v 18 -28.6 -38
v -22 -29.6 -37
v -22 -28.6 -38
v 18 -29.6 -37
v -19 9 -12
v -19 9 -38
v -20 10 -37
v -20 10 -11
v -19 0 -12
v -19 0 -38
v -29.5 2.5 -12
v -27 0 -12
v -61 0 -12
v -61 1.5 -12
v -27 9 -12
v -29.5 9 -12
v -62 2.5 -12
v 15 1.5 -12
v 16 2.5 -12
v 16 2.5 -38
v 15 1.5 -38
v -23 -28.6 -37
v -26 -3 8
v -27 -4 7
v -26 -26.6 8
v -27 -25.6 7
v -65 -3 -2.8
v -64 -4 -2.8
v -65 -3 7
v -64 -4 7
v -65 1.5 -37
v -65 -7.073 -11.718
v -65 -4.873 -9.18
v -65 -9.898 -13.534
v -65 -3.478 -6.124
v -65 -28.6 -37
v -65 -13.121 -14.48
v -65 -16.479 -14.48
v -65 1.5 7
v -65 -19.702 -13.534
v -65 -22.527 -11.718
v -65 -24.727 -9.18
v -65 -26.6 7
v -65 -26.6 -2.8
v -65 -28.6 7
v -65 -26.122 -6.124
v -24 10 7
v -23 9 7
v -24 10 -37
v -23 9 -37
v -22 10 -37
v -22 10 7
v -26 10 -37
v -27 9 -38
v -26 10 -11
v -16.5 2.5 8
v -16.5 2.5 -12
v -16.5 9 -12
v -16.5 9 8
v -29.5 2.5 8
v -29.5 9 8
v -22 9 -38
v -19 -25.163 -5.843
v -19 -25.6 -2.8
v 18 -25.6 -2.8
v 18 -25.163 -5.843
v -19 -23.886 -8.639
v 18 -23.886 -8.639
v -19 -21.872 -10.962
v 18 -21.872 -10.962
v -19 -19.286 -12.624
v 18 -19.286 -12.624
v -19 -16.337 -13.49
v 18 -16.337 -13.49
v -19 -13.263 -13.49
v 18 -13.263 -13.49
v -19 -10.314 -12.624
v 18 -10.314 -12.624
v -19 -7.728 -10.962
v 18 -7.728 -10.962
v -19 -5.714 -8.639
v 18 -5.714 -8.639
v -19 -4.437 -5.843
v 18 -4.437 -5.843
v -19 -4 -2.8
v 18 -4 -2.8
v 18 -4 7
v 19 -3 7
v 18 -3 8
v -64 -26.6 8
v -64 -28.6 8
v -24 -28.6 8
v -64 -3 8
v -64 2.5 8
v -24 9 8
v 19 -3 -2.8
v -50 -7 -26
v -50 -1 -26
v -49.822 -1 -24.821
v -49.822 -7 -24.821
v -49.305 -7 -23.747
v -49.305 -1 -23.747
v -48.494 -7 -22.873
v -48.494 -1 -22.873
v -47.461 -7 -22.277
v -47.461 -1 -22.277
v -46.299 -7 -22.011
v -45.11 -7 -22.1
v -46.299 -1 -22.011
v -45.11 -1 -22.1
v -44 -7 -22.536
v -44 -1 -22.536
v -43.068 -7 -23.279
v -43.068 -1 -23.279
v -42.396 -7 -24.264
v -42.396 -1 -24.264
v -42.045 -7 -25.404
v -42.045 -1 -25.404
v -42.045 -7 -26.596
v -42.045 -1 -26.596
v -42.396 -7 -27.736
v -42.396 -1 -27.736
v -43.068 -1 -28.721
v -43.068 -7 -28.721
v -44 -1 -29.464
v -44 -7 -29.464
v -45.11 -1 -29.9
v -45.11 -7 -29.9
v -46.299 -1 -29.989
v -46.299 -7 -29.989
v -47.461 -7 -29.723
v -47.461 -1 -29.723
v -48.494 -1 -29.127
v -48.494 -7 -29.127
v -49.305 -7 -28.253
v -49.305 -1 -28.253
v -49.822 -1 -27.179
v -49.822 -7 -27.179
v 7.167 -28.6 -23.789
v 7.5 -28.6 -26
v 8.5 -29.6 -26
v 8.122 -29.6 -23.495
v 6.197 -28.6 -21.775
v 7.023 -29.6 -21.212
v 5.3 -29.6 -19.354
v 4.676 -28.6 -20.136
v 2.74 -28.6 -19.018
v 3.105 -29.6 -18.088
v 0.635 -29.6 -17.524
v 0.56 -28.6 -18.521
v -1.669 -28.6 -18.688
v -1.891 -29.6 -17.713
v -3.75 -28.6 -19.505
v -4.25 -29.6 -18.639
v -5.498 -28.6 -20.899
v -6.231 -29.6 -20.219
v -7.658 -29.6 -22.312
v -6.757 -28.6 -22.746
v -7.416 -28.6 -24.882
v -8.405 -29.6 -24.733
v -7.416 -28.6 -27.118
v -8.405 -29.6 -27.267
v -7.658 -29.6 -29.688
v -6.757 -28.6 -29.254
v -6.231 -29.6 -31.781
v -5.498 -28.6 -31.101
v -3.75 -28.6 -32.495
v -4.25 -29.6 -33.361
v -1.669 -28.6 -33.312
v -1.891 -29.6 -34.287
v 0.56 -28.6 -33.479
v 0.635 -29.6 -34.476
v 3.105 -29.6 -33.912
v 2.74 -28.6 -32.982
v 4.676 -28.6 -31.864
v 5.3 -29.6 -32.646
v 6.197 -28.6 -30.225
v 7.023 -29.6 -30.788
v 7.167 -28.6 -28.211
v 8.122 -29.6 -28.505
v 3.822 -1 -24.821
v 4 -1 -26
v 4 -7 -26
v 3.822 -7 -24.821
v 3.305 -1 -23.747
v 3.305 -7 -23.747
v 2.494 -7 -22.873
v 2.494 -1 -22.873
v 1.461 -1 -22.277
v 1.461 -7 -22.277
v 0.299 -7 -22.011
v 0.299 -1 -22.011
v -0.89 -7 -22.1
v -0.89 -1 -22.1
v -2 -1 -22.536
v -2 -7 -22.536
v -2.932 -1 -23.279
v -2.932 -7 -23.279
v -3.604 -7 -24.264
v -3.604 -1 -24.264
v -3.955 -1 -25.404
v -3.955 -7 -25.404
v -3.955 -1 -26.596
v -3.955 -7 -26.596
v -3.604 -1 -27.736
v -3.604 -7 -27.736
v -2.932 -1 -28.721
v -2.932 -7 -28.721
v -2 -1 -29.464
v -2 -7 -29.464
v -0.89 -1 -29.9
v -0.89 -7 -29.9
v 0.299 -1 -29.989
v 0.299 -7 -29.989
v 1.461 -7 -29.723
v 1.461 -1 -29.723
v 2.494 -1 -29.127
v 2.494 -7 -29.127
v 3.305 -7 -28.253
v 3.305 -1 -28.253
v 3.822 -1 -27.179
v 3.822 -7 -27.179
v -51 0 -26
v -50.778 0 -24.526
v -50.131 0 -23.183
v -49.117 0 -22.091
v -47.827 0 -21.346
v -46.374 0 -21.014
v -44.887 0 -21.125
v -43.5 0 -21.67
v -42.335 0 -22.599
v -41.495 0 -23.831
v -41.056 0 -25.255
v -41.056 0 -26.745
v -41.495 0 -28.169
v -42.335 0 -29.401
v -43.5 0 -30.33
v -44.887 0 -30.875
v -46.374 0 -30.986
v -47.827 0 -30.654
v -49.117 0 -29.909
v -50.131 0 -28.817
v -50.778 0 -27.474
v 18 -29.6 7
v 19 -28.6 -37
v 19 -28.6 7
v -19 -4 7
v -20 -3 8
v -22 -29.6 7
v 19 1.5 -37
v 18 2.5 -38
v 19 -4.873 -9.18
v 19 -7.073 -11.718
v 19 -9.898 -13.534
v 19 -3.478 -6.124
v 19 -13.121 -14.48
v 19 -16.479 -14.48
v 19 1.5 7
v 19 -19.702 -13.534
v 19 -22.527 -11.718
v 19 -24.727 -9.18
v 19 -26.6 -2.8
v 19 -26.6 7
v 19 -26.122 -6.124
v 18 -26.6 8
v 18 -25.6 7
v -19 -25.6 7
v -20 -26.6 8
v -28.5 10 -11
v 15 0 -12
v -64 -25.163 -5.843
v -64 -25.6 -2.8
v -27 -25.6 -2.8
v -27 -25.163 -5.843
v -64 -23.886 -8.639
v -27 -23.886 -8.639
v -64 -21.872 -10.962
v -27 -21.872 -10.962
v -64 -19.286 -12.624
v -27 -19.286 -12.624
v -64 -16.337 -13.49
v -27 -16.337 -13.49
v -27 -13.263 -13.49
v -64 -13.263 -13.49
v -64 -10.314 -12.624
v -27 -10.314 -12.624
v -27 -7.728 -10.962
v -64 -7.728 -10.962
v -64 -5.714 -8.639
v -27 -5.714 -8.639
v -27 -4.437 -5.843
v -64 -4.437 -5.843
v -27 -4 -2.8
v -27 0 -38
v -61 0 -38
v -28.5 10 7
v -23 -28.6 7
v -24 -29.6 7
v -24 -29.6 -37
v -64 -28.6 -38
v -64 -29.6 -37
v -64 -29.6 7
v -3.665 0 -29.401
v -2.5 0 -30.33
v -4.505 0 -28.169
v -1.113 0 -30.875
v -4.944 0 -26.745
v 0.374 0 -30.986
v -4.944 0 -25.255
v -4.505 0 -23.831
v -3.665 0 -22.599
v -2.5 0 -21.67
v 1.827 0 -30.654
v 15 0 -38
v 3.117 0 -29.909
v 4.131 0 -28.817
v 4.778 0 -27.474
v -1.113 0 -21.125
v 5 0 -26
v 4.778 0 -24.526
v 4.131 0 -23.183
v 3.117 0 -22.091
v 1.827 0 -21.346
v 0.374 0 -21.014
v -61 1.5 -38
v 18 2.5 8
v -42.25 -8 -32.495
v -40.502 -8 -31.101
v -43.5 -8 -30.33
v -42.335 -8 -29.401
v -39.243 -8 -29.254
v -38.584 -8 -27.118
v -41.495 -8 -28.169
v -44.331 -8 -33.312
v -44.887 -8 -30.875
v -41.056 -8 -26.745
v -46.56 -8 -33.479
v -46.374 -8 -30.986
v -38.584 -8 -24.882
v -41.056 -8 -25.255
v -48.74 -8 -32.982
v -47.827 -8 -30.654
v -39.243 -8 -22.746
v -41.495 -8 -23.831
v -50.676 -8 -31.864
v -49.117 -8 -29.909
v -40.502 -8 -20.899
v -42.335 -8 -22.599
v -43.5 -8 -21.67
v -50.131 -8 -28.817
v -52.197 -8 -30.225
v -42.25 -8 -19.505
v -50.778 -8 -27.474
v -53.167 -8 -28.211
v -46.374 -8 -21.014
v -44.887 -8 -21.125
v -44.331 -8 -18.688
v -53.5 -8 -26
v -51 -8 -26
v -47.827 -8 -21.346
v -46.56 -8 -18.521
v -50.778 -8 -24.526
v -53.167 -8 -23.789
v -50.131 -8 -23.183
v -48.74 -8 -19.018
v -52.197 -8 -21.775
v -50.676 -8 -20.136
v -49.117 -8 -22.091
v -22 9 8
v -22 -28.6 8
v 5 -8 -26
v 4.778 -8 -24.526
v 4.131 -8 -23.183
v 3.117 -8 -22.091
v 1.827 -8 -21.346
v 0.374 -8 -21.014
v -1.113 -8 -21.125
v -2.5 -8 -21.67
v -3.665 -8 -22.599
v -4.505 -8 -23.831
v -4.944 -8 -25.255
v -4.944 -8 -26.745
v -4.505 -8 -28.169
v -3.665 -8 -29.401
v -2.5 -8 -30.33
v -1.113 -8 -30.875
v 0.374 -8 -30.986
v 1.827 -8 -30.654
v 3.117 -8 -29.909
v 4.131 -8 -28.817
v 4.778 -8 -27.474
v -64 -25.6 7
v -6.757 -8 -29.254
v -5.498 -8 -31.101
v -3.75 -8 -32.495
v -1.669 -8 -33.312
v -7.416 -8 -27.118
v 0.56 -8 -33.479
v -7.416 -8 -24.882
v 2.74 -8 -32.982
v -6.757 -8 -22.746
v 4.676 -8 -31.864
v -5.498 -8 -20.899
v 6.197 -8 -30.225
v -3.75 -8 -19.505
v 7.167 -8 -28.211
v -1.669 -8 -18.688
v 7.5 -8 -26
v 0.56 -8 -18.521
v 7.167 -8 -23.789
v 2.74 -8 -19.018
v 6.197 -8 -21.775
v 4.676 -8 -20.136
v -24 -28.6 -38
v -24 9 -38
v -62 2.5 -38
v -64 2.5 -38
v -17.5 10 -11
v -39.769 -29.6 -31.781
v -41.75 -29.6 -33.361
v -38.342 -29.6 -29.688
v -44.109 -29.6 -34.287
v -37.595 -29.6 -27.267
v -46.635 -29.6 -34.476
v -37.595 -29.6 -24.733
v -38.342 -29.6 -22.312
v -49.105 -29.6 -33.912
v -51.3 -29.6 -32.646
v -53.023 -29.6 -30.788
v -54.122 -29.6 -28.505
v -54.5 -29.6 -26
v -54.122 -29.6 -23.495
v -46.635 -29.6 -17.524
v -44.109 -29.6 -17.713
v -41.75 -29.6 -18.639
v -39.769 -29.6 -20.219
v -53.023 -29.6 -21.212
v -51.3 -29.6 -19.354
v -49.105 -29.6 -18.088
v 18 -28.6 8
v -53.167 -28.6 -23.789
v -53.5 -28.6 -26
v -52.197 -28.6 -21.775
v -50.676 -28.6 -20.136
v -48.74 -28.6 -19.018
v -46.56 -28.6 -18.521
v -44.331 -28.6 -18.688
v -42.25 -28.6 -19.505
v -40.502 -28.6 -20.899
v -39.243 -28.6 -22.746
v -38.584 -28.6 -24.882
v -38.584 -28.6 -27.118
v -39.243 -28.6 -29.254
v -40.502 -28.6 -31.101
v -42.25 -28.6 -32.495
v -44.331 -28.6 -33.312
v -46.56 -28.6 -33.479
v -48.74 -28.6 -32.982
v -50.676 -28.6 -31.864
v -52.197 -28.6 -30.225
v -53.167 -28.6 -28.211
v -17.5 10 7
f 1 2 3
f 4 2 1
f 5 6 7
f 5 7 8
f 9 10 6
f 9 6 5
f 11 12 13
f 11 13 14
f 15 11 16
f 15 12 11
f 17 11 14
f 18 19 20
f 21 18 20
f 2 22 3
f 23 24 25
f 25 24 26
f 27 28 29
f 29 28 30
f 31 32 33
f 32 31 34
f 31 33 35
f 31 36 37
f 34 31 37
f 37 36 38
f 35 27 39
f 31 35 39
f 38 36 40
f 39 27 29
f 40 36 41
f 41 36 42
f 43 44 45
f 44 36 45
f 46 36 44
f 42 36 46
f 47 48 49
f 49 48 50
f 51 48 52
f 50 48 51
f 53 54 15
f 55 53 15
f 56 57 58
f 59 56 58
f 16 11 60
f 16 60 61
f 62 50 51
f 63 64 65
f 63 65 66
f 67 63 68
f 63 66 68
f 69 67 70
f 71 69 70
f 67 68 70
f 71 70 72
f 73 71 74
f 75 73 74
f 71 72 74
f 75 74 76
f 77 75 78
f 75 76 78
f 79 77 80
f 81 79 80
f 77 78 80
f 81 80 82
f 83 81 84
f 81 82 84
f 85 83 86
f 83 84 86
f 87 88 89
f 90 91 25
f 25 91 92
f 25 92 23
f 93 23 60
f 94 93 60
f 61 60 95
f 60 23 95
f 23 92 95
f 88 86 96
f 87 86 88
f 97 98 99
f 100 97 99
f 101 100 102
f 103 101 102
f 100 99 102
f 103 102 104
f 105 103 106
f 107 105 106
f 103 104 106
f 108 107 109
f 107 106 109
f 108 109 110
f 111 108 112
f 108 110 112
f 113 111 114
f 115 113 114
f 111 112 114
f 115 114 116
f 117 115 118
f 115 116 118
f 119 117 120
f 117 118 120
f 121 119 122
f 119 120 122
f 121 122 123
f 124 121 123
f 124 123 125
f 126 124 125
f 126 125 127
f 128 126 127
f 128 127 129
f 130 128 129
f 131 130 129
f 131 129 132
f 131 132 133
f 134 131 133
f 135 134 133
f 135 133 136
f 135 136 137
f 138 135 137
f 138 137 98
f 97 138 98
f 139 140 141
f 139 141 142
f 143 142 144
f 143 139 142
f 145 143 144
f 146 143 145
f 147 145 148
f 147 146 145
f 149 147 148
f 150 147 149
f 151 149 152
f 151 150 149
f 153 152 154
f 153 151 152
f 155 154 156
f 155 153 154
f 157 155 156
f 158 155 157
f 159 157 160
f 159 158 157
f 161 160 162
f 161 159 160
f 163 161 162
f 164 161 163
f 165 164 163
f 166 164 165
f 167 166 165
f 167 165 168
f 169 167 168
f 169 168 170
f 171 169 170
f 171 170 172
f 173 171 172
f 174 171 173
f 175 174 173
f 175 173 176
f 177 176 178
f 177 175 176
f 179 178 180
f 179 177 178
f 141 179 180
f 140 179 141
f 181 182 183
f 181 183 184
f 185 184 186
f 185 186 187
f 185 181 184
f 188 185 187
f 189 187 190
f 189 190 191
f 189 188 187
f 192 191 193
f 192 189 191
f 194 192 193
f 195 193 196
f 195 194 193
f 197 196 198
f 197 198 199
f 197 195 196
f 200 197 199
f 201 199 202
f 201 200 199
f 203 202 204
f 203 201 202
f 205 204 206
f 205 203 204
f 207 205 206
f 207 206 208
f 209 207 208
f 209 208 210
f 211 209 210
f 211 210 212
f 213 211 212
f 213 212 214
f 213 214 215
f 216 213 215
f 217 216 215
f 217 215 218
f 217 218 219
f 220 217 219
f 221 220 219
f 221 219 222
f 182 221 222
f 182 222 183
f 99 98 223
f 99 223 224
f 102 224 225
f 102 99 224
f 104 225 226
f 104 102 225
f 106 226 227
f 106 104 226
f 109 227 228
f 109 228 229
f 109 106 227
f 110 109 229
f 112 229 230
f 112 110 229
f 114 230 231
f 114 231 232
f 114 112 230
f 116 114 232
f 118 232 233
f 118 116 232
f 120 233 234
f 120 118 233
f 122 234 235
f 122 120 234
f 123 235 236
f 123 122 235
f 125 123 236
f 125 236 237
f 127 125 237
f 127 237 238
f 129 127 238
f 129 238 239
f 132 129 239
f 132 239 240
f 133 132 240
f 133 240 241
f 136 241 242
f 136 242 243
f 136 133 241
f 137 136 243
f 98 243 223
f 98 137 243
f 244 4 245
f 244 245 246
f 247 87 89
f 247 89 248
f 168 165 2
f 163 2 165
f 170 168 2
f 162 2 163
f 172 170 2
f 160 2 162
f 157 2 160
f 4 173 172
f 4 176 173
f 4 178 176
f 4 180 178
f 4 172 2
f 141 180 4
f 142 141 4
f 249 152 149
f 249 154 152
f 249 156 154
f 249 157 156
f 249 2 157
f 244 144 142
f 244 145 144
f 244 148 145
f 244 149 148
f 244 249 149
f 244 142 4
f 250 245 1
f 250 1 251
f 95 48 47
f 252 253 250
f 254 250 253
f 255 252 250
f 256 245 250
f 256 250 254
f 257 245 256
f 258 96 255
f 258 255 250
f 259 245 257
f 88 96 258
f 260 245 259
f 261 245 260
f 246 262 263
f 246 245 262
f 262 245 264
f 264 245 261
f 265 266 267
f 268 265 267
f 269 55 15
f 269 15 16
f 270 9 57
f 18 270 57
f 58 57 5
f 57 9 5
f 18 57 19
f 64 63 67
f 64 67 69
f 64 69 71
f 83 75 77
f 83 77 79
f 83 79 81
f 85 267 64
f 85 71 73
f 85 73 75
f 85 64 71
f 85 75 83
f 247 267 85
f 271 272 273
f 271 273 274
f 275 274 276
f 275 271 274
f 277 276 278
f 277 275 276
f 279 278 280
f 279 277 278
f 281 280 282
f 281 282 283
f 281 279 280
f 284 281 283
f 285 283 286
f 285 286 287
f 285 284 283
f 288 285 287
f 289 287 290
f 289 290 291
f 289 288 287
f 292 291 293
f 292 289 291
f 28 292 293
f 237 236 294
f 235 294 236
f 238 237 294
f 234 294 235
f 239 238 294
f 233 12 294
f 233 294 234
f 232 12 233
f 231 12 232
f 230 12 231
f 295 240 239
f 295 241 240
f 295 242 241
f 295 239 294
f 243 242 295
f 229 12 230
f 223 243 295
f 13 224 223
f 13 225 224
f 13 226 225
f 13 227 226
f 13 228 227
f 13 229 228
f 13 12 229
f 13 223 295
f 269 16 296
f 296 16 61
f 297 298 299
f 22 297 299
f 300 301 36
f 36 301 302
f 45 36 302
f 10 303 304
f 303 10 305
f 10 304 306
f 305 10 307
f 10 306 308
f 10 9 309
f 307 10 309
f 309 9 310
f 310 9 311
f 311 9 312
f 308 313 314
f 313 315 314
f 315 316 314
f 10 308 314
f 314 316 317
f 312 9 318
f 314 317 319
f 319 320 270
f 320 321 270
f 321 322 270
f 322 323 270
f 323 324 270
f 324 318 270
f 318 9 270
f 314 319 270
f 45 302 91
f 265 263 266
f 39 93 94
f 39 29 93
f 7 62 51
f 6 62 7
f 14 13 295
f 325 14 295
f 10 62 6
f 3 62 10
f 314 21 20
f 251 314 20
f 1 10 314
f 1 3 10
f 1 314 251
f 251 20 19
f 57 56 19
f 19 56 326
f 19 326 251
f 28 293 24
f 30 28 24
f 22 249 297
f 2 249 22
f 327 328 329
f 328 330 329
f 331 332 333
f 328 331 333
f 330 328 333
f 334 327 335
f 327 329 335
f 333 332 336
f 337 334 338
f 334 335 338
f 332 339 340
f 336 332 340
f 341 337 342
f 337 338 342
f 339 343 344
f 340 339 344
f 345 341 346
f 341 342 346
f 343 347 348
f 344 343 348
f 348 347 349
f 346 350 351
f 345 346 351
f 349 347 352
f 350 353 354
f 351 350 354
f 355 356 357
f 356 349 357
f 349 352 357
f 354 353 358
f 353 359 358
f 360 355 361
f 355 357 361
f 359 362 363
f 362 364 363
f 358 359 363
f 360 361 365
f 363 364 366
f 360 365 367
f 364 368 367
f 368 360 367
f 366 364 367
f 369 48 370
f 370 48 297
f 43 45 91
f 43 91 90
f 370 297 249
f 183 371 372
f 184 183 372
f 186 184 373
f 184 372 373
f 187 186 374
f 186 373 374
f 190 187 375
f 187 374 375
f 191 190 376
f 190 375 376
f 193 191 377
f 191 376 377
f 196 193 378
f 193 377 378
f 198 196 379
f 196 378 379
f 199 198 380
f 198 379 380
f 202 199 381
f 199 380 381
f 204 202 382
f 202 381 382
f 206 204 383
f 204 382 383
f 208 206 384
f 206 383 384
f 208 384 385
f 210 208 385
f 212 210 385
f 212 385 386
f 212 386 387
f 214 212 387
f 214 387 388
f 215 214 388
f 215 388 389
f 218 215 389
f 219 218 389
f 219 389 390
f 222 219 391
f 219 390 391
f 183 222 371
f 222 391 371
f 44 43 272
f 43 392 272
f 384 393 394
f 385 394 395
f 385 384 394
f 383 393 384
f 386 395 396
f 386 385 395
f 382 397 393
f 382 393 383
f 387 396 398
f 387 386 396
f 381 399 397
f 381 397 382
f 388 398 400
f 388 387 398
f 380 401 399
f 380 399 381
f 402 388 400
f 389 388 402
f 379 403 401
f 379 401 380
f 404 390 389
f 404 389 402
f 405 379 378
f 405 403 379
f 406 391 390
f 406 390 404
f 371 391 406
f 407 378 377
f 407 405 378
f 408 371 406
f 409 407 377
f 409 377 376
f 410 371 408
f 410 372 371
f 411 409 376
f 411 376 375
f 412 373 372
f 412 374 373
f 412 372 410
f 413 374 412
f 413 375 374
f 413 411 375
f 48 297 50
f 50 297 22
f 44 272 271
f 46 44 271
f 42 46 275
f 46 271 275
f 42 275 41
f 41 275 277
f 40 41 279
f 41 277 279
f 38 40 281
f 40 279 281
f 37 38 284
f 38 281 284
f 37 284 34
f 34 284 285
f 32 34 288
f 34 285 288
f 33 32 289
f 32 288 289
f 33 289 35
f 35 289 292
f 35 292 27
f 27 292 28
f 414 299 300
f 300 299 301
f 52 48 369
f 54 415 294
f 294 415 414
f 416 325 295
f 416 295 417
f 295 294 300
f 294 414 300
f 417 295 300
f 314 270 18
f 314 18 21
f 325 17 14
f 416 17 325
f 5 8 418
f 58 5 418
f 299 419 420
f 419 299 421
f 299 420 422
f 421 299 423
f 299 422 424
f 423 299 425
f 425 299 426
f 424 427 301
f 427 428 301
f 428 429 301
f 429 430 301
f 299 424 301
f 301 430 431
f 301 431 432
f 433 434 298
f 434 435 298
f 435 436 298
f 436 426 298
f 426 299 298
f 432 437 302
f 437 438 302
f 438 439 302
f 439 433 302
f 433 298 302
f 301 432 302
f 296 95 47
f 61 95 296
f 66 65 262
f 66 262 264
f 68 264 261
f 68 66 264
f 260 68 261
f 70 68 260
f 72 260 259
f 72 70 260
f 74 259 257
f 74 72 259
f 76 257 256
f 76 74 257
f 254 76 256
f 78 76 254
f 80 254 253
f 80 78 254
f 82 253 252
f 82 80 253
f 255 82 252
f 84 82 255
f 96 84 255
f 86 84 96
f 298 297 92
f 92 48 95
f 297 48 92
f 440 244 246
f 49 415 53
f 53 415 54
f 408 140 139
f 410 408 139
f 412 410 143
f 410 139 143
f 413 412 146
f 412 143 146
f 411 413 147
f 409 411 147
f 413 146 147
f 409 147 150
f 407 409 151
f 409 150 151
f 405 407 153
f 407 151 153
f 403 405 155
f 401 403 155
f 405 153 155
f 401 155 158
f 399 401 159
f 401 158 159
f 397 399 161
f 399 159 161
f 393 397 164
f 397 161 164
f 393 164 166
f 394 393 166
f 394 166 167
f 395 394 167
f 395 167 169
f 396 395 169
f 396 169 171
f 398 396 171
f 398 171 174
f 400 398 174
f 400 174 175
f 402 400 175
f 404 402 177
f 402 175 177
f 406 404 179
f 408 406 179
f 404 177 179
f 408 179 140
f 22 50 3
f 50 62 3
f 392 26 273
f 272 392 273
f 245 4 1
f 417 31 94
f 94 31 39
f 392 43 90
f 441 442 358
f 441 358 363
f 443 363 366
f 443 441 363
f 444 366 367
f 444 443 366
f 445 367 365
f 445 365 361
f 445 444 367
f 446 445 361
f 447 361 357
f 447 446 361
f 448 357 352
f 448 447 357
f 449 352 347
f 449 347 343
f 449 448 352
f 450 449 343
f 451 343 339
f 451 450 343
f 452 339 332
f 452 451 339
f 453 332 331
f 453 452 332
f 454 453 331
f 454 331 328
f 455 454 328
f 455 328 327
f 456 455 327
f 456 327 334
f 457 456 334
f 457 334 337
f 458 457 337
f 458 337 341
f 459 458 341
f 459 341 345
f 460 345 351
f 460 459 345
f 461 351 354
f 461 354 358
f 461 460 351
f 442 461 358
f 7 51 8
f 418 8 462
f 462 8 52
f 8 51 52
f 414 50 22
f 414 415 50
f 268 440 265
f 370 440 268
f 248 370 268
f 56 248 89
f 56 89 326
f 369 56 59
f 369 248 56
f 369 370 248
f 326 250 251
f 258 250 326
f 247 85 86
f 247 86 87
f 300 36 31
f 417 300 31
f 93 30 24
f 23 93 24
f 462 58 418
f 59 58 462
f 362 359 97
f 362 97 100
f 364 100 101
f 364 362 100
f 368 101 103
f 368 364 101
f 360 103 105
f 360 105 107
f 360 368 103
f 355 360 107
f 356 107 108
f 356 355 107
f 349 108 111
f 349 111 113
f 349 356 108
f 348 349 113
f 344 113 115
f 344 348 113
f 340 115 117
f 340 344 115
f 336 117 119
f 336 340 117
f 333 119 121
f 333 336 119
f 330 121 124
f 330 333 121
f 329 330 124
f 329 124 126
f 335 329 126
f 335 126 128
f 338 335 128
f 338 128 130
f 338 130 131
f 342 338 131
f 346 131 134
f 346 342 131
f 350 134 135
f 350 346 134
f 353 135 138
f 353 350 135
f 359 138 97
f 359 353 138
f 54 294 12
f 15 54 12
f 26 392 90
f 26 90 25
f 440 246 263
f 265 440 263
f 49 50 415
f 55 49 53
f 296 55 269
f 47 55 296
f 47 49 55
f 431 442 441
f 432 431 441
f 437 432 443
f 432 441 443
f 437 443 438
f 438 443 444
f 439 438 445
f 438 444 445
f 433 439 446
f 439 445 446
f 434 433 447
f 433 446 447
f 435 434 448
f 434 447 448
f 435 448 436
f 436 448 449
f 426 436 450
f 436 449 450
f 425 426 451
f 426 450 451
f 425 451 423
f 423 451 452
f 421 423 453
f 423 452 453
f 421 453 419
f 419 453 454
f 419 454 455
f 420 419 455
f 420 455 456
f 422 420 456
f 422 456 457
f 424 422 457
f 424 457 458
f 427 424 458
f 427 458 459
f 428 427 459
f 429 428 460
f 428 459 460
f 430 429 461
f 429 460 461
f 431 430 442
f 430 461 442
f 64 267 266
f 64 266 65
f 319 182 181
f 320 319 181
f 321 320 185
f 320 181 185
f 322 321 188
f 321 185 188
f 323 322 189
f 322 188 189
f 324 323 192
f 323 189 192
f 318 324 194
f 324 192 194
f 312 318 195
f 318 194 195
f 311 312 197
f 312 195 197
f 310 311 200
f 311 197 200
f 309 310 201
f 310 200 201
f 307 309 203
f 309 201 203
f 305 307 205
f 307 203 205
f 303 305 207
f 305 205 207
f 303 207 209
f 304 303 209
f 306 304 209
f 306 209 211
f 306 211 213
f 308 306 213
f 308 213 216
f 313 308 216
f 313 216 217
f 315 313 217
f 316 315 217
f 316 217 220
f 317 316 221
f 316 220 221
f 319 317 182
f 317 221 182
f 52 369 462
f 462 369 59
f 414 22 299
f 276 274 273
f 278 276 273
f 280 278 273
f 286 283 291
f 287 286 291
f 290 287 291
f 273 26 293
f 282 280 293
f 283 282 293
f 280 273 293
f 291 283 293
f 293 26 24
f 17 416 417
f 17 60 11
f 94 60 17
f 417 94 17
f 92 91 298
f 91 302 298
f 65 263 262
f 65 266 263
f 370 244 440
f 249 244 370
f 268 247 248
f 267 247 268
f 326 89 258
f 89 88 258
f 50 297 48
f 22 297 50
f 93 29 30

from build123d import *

# Parameters (mm, degrees)
F6_R      = 7.5
F6_R_2    = 4
F6_W      = 4
F6_H      = 4
F7_DEPTH  = 29.6
F8_DEPTH  = 2.5
F9_DEPTH  = 10
F10_DEPTH = 2.5
F12_DEPTH = 38
F14_W     = 7.5
F14_H     = 20
F15_DEPTH = 2.5
F16_R     = 7.5
F16_R_2   = 4
F17_DEPTH = 21.6
F18_SIZE  = 1


with BuildPart() as f7:
    # F6 (on Front) → F7 (new body)
    with BuildSketch(Plane.XZ):
        Polygon((0, -12), (-19, -12), (-19, -34), (0, -34), (15, -34), (15, -12), align=None)
        with Locations((0, -26)):
            Circle(F6_R, mode=Mode.SUBTRACT)
        Polygon((15, 8), (0, 8), (-19, 8), (-19, -12), (0, -12), (15, -12), align=None)
        Circle(F6_R_2, mode=Mode.SUBTRACT)
        with Locations((0, -26)):
            Circle(F6_R)
        with Locations((0, -26)):
            Circle(F6_R_2, mode=Mode.SUBTRACT)
        Polygon((-19, -12), (-19, 8), (-23, 8), (-23, -34), (-19, -34), align=None)
        Polygon((19, 8), (15, 8), (15, -12), (15, -34), (19, -34), align=None)
        Polygon((0, -34), (-19, -34), (-19, -38), (15, -38), (15, -34), align=None)
        Circle(F6_R_2)
        with Locations((-21, -36)):
            Rectangle(F6_W, F6_H)
        with Locations((17, -36)):
            Rectangle(F6_W, F6_H)
    extrude(amount=F7_DEPTH)

    # F6 (on Front) → F8 (join)
    with BuildSketch(Plane.XZ):
        Polygon((15, 8), (0, 8), (-19, 8), (-19, -12), (0, -12), (15, -12), align=None)
        Circle(F6_R_2, mode=Mode.SUBTRACT)
        Circle(F6_R_2)
    extrude(amount=-F8_DEPTH)

    # F6 (on Front) → F9 (join)
    with BuildSketch(Plane.XZ):
        Polygon((-19, -12), (-19, 8), (-23, 8), (-23, -34), (-19, -34), align=None)
        with Locations((-21, -36)):
            Rectangle(F6_W, F6_H)
    extrude(amount=-F9_DEPTH)

    # F6 (on Front) → F10 (join)
    with BuildSketch(Plane.XZ):
        Polygon((19, 8), (15, 8), (15, -12), (15, -34), (19, -34), align=None)
        with Locations((17, -36)):
            Rectangle(F6_W, F6_H)
    extrude(amount=-F10_DEPTH)

    # F11 (on face) → F12 (cut)
    with BuildSketch(Plane.YZ.offset(19)):
        with BuildLine():
            Line((-25.6, 8), (-25.6, -2.8))
            ThreePointArc((-25.6, -2.8), (-14.8, -13.6), (-4, -2.8))
            Line((-4, -2.8), (-4, 8))
            Line((-4, 8), (-25.6, 8))
        make_face()
    extrude(amount=-F12_DEPTH, mode=Mode.SUBTRACT)

    # F13: union 

    # F14 (on face) → F15 (join)
    with BuildSketch(Plane.YZ.offset(-19)):
        with Locations((6.25, -2)):
            Rectangle(F14_W, F14_H)
    extrude(amount=F15_DEPTH)

    # F16 (on face) → F17 (cut)
    with BuildSketch(Plane.XZ.offset(29.6)):
        with Locations((0, -26)):
            Circle(F16_R)
        with Locations((0, -26)):
            Circle(F16_R_2, mode=Mode.SUBTRACT)
    extrude(amount=-F17_DEPTH, mode=Mode.SUBTRACT)

    # F18
    f18_edges = [f7.edges().sort_by_distance(p)[0] for p in [
        (-4, 0, -26),
        (-23, -9.8, 8),
        (-23, -29.6, -15),
        (-23, -9.8, -38),
        (-23, 10, -15),
        (-2, -29.6, 8),
        (-2, -29.6, -38),
        (19, -29.6, -15),
        (-7.5, -29.6, -26),
        (19, -13.55, -38),
        (19, 2.5, -15),
        (19, -0.75, 8),
        (19, -4, 2.6),
        (19, -14.8, -13.6),
        (19, -25.6, 2.6),
        (19, -27.6, 8),
        (-21, 10, -38),
        (-19, 10, -25),
        (-17.75, 10, -12),
        (-16.5, 10, -2),
        (-19.75, 10, 8),
        (15, 2.5, -25),
        (-4, -8, -26),
        (0, -4, 8),
        (-19, -14.8, 8),
        (0, -25.6, 8),
    ]]
    chamfer(f18_edges, length=F18_SIZE)


with BuildPart() as f19_1:
    # F19: instance of F7
    add(f7.part.mirror(Plane(origin=(-23, -9.8, -15), x_dir=(0, -1, 0), z_dir=(-1, 0, 0))))


solid = Compound([f7.part, f19_1.part])
